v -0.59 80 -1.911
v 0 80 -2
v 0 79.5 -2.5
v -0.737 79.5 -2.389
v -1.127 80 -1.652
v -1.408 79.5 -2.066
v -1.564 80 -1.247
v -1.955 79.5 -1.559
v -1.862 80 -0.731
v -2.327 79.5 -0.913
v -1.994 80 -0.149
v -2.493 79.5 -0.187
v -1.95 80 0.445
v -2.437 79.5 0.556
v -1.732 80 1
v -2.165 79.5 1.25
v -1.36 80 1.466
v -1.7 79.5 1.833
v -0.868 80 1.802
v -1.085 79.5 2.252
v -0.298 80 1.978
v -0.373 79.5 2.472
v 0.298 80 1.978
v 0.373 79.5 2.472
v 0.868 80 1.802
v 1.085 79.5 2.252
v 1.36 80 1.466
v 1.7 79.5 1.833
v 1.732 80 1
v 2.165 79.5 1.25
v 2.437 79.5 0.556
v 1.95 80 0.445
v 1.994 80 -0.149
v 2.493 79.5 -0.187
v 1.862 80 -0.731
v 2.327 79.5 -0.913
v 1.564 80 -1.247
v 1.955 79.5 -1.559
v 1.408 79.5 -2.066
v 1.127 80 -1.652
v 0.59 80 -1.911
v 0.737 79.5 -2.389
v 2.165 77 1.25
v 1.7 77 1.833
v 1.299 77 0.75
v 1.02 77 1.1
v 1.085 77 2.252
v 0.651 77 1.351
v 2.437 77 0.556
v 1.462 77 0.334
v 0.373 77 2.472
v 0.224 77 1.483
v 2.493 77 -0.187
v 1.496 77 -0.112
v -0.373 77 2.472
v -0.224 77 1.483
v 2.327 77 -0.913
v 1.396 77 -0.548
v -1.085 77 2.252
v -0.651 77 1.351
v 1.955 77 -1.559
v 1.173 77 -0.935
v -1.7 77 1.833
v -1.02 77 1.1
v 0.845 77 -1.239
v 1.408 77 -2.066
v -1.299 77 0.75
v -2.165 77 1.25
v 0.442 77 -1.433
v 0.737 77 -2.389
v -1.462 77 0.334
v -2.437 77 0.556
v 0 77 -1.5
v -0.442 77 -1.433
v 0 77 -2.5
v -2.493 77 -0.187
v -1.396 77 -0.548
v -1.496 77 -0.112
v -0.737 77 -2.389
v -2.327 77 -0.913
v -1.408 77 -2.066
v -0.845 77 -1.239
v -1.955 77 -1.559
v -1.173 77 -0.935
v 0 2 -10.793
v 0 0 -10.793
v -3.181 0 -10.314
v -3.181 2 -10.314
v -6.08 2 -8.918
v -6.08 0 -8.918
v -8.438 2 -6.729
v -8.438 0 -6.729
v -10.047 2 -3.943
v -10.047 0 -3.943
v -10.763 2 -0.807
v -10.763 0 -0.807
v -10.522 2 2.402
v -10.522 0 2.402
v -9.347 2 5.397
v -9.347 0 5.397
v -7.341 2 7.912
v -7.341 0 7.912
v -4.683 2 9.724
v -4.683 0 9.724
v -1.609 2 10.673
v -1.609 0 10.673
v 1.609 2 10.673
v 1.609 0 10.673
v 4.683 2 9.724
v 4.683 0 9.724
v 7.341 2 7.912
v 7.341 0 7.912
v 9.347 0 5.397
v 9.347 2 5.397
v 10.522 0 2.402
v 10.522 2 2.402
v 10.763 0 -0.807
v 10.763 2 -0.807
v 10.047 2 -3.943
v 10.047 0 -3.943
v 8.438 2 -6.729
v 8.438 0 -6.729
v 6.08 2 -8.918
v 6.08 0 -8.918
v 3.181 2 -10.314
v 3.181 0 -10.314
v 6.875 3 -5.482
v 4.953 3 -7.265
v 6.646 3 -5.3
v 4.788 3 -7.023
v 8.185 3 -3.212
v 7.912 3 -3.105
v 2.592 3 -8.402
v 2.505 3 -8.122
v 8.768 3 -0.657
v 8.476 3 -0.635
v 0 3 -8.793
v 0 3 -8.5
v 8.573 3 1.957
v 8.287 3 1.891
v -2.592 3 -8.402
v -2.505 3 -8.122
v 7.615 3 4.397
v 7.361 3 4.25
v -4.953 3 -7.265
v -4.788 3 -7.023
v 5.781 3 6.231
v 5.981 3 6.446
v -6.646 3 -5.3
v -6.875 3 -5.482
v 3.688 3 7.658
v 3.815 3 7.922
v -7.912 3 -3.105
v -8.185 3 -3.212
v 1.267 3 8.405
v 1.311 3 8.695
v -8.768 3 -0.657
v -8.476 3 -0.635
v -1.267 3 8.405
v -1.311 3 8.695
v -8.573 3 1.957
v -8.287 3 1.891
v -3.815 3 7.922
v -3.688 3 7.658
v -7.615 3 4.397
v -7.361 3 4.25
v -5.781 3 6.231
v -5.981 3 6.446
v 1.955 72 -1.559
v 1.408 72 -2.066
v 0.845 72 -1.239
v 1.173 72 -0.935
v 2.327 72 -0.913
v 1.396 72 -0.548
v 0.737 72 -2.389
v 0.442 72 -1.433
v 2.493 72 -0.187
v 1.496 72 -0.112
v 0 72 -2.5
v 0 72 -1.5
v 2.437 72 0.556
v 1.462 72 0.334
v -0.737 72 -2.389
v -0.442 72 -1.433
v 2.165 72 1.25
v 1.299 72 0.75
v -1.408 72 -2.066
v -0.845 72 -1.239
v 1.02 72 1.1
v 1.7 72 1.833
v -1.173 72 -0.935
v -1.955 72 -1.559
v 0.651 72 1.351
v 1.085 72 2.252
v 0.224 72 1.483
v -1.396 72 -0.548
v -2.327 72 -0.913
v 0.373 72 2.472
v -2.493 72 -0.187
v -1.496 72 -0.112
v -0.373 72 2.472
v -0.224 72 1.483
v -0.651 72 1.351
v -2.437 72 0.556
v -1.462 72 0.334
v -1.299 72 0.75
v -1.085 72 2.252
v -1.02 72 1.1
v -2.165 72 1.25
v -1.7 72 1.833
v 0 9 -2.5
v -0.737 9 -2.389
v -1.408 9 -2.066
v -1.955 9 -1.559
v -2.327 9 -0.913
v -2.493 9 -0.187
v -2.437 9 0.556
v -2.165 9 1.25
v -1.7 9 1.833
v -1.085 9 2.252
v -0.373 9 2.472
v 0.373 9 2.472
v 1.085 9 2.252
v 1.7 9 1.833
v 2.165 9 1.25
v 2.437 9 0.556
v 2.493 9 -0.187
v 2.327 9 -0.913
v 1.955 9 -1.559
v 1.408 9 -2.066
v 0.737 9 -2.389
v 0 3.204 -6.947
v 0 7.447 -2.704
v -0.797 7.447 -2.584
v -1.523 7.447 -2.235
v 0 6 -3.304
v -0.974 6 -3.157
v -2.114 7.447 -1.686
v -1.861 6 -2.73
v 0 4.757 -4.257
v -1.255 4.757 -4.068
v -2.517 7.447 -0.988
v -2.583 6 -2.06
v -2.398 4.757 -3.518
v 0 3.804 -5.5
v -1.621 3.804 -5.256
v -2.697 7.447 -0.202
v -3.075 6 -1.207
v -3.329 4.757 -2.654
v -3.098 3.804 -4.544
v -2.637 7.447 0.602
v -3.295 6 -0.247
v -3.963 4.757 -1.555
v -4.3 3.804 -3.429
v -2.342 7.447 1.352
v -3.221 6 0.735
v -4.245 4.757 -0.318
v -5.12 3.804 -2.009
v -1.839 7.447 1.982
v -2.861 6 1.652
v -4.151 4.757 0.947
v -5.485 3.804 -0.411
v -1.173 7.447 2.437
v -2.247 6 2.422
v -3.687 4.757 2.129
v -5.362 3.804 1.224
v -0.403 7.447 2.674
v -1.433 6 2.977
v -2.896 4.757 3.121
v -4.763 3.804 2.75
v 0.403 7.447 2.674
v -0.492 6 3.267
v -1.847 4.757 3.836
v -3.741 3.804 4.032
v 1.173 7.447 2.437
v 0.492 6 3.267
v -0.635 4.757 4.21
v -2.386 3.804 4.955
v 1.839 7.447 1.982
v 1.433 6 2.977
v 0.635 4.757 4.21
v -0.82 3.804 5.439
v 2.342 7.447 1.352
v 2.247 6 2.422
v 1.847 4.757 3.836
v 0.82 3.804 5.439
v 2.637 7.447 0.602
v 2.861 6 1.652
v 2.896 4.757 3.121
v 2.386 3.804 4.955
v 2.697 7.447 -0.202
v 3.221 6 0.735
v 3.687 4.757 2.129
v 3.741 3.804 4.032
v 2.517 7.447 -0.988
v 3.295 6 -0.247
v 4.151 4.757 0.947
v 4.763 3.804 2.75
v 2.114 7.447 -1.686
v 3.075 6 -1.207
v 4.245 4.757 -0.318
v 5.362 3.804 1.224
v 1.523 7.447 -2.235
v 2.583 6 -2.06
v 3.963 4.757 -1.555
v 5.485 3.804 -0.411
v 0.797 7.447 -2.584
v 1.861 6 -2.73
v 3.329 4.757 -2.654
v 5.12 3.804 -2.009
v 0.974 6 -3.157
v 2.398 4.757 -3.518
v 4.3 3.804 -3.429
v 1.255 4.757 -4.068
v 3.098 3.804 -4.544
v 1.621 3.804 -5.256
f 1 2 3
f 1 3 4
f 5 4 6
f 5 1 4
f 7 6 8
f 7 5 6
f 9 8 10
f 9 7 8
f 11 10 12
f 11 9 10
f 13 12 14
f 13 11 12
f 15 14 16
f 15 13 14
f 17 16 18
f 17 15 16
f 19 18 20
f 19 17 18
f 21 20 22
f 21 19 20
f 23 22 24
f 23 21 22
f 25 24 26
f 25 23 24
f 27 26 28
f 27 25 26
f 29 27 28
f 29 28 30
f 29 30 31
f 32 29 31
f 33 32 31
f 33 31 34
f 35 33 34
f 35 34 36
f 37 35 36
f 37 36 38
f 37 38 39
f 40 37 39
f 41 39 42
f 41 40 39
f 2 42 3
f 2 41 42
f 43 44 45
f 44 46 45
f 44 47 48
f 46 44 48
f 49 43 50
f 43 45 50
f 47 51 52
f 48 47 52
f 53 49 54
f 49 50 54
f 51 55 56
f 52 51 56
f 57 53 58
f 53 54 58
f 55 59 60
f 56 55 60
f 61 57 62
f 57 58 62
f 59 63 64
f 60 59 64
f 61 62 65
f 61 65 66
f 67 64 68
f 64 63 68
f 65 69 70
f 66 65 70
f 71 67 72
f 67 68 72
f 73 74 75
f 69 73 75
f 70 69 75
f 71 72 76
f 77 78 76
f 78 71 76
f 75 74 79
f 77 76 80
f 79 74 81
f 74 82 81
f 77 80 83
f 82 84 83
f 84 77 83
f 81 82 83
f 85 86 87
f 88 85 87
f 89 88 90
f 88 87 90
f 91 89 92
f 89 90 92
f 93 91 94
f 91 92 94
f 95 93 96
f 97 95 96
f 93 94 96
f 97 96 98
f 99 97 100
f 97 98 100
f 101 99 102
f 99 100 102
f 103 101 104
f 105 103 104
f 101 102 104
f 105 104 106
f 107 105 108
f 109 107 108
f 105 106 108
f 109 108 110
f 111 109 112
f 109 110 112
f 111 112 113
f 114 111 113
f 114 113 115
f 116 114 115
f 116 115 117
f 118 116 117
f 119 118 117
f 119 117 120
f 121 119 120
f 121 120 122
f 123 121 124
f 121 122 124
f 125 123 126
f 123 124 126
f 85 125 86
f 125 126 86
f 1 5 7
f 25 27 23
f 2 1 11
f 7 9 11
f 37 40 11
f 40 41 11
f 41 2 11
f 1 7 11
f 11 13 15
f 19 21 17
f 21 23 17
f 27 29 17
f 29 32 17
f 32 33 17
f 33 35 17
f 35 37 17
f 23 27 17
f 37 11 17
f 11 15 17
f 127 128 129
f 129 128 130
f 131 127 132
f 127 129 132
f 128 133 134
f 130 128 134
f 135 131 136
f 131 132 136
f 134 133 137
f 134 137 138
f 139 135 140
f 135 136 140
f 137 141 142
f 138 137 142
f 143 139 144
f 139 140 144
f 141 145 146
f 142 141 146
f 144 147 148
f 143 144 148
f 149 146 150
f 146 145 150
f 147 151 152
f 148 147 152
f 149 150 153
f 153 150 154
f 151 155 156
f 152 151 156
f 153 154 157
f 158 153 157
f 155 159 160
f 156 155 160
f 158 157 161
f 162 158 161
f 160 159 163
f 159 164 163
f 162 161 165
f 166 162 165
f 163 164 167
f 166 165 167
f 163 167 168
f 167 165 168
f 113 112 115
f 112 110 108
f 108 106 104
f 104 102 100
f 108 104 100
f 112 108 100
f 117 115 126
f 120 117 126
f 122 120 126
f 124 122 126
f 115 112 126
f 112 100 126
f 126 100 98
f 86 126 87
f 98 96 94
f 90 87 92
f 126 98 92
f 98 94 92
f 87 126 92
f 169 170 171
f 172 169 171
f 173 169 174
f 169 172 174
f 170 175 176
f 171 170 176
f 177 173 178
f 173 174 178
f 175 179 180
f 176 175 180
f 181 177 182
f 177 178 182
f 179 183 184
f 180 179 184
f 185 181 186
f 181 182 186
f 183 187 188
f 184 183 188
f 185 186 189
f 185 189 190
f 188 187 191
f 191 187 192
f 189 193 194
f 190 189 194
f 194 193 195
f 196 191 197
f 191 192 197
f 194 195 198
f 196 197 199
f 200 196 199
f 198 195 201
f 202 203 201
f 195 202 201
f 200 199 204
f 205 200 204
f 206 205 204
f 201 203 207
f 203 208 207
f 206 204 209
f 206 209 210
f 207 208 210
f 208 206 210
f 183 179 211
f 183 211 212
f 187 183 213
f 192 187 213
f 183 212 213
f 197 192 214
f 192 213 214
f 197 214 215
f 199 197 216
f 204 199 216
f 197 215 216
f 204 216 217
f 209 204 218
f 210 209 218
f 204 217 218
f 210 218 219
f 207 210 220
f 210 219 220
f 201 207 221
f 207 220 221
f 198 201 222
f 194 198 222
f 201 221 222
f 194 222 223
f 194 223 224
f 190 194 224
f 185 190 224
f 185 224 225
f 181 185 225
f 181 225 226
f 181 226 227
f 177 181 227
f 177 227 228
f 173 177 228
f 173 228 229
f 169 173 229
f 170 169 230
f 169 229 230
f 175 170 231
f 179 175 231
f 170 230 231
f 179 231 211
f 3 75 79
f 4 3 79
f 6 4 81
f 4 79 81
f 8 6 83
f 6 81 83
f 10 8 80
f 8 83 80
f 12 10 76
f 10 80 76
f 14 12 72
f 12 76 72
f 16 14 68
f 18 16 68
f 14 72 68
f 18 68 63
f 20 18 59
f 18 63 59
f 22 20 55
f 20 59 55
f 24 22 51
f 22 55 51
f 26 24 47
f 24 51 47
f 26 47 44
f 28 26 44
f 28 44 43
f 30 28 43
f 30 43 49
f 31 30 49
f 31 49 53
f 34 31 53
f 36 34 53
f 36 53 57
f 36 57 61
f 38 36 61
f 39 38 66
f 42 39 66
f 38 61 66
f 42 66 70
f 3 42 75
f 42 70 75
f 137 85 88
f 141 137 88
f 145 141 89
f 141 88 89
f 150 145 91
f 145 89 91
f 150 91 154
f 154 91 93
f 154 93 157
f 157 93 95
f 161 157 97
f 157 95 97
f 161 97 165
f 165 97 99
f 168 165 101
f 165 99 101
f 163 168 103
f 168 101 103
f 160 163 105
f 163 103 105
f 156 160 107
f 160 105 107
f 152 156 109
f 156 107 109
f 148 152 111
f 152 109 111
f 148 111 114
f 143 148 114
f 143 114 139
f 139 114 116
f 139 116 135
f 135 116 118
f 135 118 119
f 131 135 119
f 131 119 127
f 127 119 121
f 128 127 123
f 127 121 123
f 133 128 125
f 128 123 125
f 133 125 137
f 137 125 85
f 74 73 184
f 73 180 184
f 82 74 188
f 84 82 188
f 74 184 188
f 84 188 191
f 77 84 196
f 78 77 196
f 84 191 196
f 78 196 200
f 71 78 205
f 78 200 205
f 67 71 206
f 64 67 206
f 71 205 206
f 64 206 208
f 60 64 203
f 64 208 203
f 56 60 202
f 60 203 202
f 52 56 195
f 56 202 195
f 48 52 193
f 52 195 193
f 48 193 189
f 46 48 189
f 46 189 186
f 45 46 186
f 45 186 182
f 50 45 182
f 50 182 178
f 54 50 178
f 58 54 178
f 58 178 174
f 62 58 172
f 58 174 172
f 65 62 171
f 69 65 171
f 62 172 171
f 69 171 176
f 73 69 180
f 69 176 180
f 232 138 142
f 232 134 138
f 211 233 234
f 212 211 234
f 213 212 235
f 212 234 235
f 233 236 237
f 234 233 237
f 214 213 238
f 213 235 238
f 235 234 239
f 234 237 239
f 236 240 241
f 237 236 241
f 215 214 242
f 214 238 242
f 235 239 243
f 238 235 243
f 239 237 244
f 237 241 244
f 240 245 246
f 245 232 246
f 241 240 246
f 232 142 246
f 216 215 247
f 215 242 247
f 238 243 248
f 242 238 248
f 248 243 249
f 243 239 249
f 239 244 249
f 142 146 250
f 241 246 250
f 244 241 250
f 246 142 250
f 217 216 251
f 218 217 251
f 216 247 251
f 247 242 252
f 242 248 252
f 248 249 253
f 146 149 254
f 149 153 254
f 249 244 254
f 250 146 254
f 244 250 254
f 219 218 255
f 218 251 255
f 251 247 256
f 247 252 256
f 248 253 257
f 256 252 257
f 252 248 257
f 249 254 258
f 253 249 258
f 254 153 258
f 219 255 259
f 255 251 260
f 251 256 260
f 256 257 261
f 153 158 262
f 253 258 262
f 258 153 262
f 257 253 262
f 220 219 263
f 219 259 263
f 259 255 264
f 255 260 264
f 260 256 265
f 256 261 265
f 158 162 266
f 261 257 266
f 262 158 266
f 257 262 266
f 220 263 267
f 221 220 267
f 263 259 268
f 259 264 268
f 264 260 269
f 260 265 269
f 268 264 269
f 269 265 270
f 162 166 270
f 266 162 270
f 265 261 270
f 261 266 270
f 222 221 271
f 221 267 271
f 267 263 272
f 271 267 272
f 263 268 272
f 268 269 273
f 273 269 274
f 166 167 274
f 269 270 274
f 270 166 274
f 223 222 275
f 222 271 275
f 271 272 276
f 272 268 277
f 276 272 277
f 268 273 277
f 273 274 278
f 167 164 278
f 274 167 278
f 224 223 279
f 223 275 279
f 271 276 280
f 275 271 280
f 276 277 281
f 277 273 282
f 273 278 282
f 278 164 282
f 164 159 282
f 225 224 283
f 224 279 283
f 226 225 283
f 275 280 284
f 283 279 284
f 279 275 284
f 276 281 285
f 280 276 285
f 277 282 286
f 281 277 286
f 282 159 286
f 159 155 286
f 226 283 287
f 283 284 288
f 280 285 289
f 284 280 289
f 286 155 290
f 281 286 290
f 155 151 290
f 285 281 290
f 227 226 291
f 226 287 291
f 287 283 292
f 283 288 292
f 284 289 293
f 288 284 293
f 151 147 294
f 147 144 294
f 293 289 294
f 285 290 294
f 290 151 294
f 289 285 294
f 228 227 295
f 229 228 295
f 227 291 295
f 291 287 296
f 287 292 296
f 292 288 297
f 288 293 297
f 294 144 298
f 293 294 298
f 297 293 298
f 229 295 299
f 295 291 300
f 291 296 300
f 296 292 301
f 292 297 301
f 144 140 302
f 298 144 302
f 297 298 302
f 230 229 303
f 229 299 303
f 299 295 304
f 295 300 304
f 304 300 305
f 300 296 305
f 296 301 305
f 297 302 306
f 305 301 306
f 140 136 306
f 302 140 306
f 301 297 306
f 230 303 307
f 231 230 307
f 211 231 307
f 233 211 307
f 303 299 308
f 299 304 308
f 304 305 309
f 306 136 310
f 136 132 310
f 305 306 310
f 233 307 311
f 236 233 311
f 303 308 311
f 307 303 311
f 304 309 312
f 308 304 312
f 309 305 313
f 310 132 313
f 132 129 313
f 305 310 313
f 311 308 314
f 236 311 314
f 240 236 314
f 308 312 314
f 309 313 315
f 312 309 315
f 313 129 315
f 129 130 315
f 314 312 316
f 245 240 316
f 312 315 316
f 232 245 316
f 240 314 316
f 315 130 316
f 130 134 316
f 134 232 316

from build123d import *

# Parameters (mm, degrees)
FILLET1_R      = 6
CHAMFER1_SIZE  = 0.5
CHAMFER2_SIZE  = 2
CHAMFER2_SIZE2 = 1


with BuildPart() as part:
    # Sketch1 → Revolve1 (revolve)
    with BuildSketch(Plane.XY, mode=Mode.PRIVATE) as revolve1_sk:
        Polygon((0, 0), (0, 80), (2.5, 80), (2.5, 77), (1.5, 77), (1.5, 72), (2.5, 72), (2.5, 3), (10.793050135, 3), (10.793050135, 0), align=None)
    revolve(revolve1_sk.sketch.rotate(Axis((0, 0, 0), (0, 1, 0)), 90), axis=Axis((0, 0, 0), (0, 1, 0)))

    # Fillet1
    fillet1_edges = [part.edges().sort_by_distance(p)[0] for p in [
        (0, 3, 2.5),
    ]]
    fillet(fillet1_edges, radius=FILLET1_R)

    # Chamfer1
    chamfer1_edges = [part.edges().sort_by_distance(p)[0] for p in [
        (0, 80, 2.5),
    ]]
    chamfer(chamfer1_edges, length=CHAMFER1_SIZE)

    # Chamfer2
    chamfer2_edges = [part.edges().sort_by_distance(p)[0] for p in [
        (0, 3, 10.793050135),
    ]]
    chamfer2_side = [part.faces().sort_by_distance(p)[0] for p in [
        (0, 3, 8.805273558),
    ]]
    chamfer(chamfer2_edges, length=CHAMFER2_SIZE, length2=CHAMFER2_SIZE2, reference=chamfer2_side[0])


solid = part.part
